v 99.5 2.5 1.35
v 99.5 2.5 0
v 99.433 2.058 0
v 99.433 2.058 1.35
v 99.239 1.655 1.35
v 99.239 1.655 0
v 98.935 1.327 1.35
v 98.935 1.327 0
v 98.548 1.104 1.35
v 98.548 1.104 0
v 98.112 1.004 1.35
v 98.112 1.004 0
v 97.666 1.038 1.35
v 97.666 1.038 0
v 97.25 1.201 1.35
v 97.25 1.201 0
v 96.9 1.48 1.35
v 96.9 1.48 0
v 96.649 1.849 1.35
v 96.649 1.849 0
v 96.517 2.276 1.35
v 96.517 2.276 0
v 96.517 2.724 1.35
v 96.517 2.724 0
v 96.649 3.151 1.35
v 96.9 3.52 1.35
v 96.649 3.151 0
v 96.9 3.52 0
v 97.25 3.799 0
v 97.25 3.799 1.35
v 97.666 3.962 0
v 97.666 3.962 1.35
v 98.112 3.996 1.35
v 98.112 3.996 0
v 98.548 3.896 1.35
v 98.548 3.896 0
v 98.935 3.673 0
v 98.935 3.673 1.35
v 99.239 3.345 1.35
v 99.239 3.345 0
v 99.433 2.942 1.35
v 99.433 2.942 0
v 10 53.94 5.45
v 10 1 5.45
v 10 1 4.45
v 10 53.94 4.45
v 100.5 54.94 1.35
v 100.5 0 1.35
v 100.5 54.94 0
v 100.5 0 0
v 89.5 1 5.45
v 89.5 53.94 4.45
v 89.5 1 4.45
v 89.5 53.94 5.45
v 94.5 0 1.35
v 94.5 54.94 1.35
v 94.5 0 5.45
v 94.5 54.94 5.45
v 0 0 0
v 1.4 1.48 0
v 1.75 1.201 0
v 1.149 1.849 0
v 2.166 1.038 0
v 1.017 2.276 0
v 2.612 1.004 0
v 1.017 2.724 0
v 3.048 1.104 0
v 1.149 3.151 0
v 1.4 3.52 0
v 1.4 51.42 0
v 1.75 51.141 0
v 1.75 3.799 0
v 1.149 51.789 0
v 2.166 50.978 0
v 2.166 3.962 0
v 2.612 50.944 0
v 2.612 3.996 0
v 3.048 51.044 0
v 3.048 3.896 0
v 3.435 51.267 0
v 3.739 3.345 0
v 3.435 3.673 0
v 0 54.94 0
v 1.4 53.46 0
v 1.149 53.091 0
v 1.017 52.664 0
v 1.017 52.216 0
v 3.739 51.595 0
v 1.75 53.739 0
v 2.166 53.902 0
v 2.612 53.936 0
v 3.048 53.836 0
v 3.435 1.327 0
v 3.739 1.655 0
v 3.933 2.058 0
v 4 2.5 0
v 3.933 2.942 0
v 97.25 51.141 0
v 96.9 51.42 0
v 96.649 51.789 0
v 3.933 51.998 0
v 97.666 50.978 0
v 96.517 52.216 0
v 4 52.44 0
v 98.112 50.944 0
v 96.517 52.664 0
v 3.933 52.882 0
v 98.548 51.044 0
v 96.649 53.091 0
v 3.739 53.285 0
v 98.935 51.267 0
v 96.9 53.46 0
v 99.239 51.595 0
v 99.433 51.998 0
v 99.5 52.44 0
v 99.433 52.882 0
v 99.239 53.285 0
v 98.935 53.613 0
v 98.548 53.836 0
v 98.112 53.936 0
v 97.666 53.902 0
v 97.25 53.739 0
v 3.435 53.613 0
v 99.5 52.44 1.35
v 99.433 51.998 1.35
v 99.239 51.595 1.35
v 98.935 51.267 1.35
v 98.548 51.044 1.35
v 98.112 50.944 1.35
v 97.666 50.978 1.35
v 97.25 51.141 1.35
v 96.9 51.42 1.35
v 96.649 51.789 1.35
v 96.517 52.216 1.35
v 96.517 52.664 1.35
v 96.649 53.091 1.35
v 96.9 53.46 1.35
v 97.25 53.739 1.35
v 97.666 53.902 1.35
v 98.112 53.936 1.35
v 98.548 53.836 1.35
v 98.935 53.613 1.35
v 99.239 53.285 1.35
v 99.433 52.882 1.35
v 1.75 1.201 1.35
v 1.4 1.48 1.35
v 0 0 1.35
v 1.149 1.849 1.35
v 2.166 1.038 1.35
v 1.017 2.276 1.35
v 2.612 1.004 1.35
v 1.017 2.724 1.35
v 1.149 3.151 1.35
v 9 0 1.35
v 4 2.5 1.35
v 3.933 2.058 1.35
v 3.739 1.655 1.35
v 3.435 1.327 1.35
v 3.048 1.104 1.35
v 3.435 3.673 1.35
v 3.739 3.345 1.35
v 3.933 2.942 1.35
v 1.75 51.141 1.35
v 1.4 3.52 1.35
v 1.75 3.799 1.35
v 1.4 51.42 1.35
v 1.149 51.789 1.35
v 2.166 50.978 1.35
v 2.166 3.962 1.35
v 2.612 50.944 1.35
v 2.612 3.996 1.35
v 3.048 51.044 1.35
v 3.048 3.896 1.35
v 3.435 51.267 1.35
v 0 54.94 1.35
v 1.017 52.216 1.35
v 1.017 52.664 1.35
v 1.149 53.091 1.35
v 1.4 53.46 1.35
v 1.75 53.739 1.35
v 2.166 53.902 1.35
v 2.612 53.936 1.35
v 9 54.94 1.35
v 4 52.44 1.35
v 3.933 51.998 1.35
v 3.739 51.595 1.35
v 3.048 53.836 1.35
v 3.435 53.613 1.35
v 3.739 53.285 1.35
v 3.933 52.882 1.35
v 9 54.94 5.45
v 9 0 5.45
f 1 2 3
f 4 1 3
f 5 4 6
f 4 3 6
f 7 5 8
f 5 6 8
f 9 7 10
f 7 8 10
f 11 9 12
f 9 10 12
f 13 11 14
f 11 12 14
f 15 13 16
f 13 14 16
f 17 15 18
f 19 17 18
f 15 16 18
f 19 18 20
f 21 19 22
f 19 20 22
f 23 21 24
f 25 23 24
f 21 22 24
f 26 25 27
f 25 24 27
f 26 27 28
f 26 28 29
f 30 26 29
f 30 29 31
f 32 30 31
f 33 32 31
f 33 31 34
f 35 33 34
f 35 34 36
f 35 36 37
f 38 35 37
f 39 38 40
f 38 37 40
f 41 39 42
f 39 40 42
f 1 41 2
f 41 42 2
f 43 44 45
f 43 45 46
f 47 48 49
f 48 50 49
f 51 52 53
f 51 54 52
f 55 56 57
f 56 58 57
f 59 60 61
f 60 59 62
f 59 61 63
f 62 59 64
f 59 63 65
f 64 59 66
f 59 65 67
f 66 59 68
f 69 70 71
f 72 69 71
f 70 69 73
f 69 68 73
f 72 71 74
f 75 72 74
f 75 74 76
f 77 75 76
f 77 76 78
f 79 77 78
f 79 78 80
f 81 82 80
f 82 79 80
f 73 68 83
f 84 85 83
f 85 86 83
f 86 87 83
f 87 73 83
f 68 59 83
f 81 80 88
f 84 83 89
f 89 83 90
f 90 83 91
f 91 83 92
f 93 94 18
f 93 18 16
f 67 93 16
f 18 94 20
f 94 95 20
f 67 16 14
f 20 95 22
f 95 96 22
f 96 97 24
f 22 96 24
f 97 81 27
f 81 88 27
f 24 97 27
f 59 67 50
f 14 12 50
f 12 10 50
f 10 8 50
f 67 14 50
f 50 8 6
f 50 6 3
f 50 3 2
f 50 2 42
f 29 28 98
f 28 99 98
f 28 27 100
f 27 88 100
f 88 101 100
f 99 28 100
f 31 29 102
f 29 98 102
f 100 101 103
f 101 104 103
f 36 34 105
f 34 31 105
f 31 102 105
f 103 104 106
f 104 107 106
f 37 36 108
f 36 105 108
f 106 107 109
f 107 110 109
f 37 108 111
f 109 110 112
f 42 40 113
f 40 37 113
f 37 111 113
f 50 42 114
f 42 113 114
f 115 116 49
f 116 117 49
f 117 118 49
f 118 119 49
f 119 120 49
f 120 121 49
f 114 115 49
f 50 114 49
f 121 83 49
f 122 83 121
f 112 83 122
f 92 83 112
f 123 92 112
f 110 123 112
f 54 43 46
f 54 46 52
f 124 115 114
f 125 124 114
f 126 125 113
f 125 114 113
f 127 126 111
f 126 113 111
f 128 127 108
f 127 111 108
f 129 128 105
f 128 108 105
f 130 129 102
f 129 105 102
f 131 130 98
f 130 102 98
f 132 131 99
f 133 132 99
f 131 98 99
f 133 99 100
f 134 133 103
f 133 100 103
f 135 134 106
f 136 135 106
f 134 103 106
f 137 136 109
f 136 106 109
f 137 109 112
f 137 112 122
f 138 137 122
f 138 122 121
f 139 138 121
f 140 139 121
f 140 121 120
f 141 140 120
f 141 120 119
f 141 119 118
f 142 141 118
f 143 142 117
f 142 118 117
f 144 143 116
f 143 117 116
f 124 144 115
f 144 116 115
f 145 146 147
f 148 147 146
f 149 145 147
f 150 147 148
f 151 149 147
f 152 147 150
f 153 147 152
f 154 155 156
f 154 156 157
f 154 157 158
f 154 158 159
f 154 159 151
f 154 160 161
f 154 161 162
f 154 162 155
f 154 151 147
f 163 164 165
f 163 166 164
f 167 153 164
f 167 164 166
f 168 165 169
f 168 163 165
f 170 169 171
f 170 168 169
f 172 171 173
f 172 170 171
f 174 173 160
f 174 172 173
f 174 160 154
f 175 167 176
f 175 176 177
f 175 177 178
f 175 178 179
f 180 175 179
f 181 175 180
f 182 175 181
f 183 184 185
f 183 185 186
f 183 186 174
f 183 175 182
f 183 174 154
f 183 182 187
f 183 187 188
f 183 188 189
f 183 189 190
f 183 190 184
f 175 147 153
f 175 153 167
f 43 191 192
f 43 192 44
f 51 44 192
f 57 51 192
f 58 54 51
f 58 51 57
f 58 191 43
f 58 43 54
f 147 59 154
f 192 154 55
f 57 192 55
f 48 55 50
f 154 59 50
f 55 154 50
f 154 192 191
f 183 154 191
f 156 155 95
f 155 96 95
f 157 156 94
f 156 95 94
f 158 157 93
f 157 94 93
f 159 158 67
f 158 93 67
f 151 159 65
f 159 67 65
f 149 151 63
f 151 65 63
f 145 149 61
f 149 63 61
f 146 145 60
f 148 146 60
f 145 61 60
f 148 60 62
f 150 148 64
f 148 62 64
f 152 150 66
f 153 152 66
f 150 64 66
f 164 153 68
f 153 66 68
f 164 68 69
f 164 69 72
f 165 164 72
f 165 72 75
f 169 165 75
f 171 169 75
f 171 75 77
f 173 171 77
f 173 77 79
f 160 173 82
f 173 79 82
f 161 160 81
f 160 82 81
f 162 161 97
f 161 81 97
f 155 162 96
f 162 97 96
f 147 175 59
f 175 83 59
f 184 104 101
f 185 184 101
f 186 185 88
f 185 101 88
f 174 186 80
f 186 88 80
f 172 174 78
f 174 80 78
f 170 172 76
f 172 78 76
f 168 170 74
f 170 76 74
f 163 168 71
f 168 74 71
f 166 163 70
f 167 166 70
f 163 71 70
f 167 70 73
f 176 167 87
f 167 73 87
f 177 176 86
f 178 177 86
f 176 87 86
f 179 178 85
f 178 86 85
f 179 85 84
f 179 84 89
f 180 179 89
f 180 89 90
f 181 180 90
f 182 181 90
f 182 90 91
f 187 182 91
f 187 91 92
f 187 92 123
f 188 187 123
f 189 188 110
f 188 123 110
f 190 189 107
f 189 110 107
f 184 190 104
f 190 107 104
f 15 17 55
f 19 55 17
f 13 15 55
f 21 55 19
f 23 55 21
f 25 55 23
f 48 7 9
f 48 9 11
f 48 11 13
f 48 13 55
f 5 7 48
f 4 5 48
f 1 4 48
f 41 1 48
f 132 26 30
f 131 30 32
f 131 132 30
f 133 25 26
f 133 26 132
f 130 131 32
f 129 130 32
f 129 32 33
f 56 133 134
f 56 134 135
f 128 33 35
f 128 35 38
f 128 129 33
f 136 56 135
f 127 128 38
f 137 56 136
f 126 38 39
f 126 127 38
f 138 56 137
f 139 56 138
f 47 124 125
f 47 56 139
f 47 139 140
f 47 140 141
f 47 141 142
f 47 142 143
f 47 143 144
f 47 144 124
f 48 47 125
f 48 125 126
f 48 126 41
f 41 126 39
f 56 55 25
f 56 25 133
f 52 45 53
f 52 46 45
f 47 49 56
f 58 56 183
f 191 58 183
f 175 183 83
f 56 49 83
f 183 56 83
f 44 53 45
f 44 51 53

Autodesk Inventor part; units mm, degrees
ref_plane "YZ Plane" through (0, 0, 0) normal (1, 0, 0) x (0, 1, 0)
ref_plane "XZ Plane" through (0, 0, 0) normal (0, 1, 0) x (-1, 0, 0)
ref_plane "XY Plane" through (0, 0, 0) normal (0, 0, 1) x (1, 0, 0)
sketch "Эскиз1" plane through (0, 0, 0) normal (0, 0, 1) x (1, 0, 0)
  line L0 (0, 0) -> (100.5, 0)
  line L1 (100.5, 0) -> (100.5, 54.94)
  line L2 (100.5, 54.94) -> (0, 54.94)
  line L3 (0, 54.94) -> (0, 0)
  circle A0 centre (2.5, 52.44) radius 1.5
  circle A1 centre (98, 52.44) radius 1.5
  line L4 (196, 54.94) -> (95.5, 54.94)
  circle A2 centre (2.5, 2.5) radius 1.5
  circle A3 centre (98, 2.5) radius 1.5
  dimension "d0" = 100.5
  dimension "d1" = 54.94
  dimension "d2" = 3
  dimension "d3" = 2.5
  dimension "d4" = 2.5
  dimension "d7" = 95.5
  dimension "d14" = 49.94
extrude "Выдавливание1" add sketch "Эскиз1" along normal blind 5.45
sketch "Эскиз2" plane through (0, 0, 5.45) normal (0, 0, 1) x (1, 0, 0)
  line L0 (9, 54.94) -> (94.5, 54.94)
  line L1 (94.5, 54.94) -> (94.5, 0)
  line L2 (94.5, 0) -> (9, 0)
  line L3 (9, 0) -> (9, 54.94)
  line L4 (100.5, 54.94) -> (0, 54.94) projected
  line L5 (100.5, 0) -> (100.5, 54.94) projected
  line L6 (-12, 65) -> (119, 65)
  line L7 (119, 65) -> (119, -14)
  line L8 (119, -14) -> (-12, -14)
  line L9 (-12, -14) -> (-12, 65)
  point P0 (0, 0)
  point P1 (50.25, 54.94)
  dimension "d21" = 85.5
  dimension "d22" = 54.94
  dimension "d23" = 6
extrude "Выдавливание2" cut sketch "Эскиз2" against normal blind 4.1
sketch "Эскиз3" plane through (0, 0, 5.45) normal (0, 0, 1) x (1, 0, 0)
  line L0 (10, 53.94) -> (89.5, 53.94)
  line L1 (89.5, 53.94) -> (89.5, 1)
  line L2 (89.5, 1) -> (10, 1)
  line L3 (10, 1) -> (10, 53.94)
  line L4 (94.5, 54.94) -> (9, 54.94) projected
  line L5 (9, 54.94) -> (9, 0) projected
  line L6 (9, 0) -> (94.5, 0) projected
  line L7 (94.5, 0) -> (94.5, 54.94) projected
  point P0 (0, 0)
  dimension "d28" = 1
  dimension "d29" = 1
  dimension "d30" = 1
  dimension "d31" = 5
extrude "Выдавливание3" cut sketch "Эскиз3" against normal blind 1 contours L0 L1 L2 L3
properties part number "NextionDisplay"
